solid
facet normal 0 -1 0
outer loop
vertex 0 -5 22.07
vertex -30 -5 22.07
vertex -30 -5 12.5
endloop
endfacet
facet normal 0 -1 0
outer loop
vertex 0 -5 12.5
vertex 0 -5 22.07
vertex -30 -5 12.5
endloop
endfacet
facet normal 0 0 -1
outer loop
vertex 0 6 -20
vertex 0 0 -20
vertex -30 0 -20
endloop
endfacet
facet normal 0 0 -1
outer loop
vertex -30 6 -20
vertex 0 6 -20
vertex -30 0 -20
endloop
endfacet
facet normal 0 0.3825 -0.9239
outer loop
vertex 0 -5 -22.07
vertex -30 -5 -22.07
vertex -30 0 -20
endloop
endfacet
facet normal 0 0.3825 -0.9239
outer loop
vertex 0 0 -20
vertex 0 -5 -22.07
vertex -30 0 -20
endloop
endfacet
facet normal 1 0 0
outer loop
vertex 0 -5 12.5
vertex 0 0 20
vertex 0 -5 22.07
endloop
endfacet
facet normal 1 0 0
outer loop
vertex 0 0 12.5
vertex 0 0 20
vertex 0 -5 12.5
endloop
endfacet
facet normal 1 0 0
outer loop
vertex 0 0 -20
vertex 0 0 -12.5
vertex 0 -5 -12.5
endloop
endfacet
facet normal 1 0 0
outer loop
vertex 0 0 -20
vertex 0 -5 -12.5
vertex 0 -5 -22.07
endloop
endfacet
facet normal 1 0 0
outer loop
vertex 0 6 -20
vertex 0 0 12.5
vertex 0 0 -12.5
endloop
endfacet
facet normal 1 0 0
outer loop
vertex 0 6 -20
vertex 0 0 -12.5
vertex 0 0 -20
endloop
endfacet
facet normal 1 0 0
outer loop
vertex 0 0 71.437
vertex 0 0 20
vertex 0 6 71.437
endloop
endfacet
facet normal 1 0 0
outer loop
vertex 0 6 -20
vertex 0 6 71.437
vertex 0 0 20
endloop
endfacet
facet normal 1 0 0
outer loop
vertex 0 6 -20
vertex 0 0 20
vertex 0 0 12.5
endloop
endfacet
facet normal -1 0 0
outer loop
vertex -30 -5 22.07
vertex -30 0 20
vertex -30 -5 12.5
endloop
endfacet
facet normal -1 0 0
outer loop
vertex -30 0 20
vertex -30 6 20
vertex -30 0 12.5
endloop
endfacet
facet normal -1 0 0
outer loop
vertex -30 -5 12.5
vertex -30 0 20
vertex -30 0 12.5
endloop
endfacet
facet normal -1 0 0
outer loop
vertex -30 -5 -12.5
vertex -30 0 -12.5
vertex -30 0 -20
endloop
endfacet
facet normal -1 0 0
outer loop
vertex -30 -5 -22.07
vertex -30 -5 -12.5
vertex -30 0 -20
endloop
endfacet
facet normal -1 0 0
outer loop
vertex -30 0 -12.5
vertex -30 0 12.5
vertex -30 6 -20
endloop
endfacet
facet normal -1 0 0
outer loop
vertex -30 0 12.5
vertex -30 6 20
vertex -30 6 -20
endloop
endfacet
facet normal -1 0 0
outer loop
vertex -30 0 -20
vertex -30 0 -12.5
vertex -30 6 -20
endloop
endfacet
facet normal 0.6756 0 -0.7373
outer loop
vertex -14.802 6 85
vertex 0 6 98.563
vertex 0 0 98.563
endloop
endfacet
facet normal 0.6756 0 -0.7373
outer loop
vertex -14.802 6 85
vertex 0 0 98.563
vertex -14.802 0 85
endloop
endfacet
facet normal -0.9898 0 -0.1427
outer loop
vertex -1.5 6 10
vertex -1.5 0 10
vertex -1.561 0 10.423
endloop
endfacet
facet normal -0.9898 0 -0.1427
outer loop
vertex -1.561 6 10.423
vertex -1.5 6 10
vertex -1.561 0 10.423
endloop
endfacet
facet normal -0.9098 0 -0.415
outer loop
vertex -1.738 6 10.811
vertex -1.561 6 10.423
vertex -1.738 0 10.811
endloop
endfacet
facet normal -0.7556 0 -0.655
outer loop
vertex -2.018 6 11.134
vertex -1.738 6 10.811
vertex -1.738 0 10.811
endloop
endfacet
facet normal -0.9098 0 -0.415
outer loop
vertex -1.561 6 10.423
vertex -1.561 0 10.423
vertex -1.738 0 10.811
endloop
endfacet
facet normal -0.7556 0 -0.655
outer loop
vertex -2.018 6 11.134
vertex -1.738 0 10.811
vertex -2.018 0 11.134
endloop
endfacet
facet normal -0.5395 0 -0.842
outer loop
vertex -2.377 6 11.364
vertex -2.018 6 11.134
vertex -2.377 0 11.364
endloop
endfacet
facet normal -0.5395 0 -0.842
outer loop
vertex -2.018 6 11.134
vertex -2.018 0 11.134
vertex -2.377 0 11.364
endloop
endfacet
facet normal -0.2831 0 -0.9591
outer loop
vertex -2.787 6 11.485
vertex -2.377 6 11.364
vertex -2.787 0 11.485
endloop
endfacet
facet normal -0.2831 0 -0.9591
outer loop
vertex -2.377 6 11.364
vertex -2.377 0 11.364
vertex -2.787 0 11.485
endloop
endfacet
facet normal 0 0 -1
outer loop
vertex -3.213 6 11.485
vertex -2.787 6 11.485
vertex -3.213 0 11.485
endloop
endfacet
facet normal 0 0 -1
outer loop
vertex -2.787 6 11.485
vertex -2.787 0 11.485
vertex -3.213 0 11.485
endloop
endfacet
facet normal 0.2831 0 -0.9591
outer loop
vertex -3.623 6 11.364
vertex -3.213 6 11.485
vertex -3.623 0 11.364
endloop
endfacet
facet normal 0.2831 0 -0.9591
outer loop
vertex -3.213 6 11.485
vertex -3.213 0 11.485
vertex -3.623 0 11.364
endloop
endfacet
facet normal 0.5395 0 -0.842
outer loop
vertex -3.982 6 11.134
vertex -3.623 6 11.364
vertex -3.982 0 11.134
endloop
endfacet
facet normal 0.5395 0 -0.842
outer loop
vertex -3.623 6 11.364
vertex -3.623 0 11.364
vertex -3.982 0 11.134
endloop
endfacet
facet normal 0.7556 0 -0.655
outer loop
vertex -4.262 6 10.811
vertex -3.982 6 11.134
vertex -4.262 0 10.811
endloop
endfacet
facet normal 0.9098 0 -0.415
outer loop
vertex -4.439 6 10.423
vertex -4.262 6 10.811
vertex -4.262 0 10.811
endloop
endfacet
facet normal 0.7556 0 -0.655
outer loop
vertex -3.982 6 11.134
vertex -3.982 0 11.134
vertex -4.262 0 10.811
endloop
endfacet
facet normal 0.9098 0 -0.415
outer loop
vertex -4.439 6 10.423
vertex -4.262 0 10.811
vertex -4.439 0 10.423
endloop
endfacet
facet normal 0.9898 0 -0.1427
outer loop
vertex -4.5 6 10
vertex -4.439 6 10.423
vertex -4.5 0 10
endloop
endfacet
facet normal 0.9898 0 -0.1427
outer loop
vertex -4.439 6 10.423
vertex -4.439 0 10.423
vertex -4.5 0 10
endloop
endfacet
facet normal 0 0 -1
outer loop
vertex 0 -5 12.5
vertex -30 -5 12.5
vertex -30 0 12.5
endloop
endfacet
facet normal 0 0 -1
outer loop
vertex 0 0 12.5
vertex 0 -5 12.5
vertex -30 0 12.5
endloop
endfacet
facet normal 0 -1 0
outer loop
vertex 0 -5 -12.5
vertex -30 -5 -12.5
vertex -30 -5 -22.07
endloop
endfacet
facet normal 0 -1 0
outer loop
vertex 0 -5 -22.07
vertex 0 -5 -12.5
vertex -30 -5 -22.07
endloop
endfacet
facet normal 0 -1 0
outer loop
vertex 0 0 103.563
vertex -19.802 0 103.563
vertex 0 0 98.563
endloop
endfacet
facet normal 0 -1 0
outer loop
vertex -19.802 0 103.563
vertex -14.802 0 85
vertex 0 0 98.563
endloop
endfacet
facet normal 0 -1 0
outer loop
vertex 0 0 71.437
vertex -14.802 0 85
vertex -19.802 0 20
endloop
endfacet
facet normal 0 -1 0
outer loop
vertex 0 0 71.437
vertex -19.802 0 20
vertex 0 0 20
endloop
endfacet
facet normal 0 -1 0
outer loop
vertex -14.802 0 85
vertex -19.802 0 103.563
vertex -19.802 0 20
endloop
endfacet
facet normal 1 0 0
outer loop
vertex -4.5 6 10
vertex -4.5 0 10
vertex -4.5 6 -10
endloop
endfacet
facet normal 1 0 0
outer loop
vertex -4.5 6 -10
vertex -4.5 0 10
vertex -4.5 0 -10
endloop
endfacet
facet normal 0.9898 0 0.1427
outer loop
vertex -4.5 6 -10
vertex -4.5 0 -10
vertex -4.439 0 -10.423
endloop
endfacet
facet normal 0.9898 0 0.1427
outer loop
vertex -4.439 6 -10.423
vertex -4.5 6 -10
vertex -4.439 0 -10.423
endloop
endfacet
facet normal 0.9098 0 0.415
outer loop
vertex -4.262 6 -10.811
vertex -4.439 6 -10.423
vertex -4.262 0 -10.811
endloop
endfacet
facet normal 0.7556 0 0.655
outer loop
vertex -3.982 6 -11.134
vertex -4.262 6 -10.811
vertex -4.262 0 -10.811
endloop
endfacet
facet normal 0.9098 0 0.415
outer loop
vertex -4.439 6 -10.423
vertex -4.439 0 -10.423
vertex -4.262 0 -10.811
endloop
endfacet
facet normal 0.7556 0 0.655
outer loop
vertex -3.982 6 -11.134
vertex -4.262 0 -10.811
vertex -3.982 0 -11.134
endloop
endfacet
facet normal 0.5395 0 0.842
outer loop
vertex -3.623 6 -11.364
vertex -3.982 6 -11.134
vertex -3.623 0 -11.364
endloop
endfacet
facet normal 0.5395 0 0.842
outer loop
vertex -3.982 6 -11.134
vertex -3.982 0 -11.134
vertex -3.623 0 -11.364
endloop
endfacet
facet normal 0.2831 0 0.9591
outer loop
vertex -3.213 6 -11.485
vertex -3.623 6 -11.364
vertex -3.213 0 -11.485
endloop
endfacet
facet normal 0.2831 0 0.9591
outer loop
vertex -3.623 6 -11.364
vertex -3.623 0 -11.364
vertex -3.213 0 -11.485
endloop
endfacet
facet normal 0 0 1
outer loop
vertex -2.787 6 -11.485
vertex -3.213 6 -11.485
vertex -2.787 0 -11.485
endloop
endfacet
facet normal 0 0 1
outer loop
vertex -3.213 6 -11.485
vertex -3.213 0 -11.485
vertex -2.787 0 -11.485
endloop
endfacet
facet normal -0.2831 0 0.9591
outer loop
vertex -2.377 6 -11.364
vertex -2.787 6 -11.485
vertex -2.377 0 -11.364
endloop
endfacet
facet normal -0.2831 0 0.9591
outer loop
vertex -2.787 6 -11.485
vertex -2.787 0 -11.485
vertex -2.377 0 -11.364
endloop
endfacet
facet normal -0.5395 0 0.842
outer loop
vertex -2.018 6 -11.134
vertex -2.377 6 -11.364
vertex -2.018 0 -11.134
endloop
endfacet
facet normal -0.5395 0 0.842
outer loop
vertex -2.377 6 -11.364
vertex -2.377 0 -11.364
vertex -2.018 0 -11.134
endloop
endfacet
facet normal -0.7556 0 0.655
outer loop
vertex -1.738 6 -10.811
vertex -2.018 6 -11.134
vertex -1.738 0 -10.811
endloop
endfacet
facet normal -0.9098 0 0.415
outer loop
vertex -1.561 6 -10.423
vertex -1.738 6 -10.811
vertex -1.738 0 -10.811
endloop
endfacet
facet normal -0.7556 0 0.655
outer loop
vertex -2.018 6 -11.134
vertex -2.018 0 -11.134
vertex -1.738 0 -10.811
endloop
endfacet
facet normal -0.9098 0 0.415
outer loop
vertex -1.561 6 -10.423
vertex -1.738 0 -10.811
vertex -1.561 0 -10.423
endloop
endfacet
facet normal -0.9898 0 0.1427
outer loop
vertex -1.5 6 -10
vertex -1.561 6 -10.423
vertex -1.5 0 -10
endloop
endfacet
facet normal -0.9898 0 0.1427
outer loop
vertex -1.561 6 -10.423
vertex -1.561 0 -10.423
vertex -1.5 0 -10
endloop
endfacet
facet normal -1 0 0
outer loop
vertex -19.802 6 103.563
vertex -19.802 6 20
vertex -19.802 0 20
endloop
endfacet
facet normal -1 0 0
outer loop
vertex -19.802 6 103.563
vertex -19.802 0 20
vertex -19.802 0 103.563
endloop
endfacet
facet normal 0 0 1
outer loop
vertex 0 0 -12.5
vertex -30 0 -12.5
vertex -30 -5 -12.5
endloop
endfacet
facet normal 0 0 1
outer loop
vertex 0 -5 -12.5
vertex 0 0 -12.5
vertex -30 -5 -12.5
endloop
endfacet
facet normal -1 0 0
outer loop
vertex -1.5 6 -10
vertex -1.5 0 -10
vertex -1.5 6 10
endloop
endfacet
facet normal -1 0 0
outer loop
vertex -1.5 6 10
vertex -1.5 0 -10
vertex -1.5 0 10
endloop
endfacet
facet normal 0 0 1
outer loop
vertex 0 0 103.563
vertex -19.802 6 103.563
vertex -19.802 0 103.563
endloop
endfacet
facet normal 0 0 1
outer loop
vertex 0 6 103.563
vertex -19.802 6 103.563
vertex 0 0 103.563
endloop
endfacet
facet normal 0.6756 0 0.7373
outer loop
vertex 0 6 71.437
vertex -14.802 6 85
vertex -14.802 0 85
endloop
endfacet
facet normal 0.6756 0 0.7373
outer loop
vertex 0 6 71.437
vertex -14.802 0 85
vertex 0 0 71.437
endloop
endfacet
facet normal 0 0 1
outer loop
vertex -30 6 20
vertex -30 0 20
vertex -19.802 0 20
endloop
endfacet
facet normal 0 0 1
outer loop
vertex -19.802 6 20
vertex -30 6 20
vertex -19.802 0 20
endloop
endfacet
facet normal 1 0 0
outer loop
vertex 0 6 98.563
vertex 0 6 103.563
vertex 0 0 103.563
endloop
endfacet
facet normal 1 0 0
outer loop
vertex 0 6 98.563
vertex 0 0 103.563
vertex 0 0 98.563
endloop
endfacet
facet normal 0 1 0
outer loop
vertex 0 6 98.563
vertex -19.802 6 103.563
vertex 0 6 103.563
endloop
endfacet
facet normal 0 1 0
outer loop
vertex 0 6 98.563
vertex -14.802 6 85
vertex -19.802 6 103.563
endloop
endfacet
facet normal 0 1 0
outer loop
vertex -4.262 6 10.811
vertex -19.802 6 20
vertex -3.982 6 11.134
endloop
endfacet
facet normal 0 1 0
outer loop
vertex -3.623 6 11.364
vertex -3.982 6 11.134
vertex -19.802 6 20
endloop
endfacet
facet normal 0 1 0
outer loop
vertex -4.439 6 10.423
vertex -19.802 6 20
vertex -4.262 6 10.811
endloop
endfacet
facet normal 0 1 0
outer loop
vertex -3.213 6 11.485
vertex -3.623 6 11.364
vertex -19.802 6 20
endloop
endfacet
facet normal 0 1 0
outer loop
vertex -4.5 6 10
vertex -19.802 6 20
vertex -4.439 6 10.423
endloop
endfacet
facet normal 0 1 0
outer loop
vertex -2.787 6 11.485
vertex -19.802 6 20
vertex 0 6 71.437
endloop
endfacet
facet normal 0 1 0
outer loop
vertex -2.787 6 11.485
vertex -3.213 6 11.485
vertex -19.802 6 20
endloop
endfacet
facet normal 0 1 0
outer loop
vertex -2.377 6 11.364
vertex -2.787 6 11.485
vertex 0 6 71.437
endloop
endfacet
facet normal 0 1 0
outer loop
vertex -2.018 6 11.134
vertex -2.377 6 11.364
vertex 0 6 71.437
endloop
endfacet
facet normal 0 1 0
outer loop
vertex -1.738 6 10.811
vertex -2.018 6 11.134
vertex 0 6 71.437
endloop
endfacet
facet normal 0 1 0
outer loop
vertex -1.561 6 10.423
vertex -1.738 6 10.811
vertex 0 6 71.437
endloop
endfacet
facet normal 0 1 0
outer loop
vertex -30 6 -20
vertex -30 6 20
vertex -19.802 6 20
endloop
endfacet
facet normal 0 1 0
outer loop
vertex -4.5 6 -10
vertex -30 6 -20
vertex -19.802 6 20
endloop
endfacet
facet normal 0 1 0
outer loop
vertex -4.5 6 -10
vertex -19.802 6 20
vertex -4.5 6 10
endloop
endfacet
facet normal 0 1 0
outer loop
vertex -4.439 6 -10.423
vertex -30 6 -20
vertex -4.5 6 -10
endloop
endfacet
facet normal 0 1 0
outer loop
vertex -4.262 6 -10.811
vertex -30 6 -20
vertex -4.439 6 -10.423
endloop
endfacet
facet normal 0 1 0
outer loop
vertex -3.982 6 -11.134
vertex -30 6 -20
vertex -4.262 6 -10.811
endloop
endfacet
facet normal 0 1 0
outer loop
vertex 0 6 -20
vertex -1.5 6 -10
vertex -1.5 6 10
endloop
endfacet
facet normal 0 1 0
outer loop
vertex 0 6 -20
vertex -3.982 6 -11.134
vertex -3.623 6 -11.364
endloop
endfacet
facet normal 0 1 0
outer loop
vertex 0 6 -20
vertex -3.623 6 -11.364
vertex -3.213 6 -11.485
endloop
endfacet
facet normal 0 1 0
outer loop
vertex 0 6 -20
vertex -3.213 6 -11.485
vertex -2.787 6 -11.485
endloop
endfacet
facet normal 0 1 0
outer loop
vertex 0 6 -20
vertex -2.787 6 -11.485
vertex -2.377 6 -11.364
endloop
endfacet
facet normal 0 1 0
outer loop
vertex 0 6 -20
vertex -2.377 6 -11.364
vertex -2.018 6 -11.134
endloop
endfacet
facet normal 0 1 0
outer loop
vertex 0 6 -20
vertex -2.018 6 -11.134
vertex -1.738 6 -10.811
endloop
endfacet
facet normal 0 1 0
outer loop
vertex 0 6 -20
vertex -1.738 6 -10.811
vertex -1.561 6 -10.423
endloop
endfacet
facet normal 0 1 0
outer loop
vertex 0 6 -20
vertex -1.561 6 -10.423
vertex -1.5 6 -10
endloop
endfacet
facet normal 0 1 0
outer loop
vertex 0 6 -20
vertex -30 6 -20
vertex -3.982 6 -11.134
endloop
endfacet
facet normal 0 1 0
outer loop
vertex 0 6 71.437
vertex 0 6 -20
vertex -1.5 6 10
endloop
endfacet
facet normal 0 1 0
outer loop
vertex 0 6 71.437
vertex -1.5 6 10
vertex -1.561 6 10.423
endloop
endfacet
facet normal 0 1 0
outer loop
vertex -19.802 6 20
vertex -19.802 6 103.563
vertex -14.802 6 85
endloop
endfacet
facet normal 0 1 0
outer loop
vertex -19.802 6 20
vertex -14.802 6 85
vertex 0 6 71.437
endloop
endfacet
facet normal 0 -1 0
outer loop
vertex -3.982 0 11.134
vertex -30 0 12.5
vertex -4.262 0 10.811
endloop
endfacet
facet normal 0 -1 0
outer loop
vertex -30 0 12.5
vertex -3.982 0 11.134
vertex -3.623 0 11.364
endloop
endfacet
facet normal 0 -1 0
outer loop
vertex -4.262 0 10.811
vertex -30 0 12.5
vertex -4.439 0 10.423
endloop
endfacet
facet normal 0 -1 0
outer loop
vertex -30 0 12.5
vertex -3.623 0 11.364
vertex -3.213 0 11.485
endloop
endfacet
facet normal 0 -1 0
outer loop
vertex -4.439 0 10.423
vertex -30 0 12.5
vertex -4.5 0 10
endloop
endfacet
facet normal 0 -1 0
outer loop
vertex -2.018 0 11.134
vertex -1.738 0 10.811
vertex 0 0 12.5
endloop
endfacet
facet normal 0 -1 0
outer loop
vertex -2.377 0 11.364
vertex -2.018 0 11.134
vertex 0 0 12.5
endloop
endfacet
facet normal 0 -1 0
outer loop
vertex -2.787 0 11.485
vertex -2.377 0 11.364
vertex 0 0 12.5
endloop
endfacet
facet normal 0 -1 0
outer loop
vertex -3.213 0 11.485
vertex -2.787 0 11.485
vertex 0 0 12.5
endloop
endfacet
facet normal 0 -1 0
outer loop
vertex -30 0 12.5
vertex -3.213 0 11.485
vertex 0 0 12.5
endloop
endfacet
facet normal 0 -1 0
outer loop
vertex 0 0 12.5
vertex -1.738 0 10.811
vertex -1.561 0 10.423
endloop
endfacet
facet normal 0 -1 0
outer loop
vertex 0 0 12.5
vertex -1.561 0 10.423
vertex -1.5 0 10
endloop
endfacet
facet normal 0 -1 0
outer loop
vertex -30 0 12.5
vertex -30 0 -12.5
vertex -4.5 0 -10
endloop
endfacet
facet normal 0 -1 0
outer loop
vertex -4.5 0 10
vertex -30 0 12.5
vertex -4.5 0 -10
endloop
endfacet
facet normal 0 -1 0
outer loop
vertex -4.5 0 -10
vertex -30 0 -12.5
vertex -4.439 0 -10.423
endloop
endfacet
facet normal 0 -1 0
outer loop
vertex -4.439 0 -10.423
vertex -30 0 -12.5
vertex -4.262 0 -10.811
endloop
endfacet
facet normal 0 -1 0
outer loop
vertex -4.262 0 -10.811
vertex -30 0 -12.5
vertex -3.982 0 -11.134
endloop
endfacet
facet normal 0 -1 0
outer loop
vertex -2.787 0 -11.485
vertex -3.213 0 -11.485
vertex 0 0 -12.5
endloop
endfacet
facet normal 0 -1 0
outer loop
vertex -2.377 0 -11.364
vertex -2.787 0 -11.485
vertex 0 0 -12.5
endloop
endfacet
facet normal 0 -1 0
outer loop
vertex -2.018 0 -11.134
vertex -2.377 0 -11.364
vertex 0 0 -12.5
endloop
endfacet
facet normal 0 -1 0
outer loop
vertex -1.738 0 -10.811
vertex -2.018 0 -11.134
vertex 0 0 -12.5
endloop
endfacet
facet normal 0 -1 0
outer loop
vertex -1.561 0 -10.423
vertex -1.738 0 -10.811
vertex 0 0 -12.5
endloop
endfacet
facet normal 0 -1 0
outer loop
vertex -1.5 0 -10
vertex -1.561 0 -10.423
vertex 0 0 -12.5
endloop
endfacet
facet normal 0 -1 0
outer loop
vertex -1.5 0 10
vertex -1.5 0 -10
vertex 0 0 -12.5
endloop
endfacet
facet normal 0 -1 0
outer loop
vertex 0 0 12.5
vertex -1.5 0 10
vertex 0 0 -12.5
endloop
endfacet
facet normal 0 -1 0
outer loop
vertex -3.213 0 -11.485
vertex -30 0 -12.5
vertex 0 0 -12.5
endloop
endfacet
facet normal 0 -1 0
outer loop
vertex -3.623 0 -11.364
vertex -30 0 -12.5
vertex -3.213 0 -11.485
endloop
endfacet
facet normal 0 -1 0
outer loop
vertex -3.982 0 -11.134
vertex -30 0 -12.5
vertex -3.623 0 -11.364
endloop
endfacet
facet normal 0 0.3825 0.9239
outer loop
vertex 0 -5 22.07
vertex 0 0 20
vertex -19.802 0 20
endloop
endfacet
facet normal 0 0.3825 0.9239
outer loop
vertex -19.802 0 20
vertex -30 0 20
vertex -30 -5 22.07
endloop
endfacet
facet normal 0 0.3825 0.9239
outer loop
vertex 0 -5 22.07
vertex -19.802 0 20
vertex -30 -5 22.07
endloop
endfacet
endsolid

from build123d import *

# Parameters (mm, degrees)
BOSS_EXTRUDE1_DEPTH        = 6
DOVE_BOSS_DEPTH            = 30
BOSS_EXTRUDE7_DEPTH        = 30
PIN_SLOT_REACH             = 39.724
PIN_SLOT_DIRECTION_2_DEPTH = 38.723710458
BOSS_EXTRUDE8_DEPTH        = 6


with BuildPart() as part:
    # Sketch1 → Boss-Extrude1 (new body)
    with BuildSketch(Plane(origin=(0, 0, 0), x_dir=(1, 0, 0), z_dir=(0, 1, 0))):
        Polygon((-30, 20), (-30, -20), (0, -20), (0, -8.167550091), (-6.853388269, 0), (0, 8.167550091), (0, 20), align=None)
        Polygon((-6.853388269, 0), (0, -8.167550091), (0, 8.167550091), align=None)
    extrude(amount=BOSS_EXTRUDE1_DEPTH)

    # Sketch7 → Dove Boss (add)
    with BuildSketch(Plane(origin=(-30, 0, 0), x_dir=(0, 0, -1), z_dir=(1, 0, 0))):
        Polygon((-12.5, 0), (-20, 0), (-22.069851171, -5), (-12.5, -5), align=None)
    extrude(amount=DOVE_BOSS_DEPTH)

    # Sketch7<3> → Boss-Extrude7 (add)
    with BuildSketch(Plane(origin=(-30, 0, 0), x_dir=(0, 0, -1), z_dir=(1, 0, 0))):
        Polygon((20, 0), (12.5, 0), (12.5, -5), (22.069851171, -5), align=None)
    extrude(amount=BOSS_EXTRUDE7_DEPTH)

    # Sketch4 → Pin Slot (cut, up to next)
    with BuildSketch(Plane(origin=(0, 0, 0), x_dir=(1, 0, 0), z_dir=(0, 1, 0)), mode=Mode.PRIVATE) as pin_slot_sk1:
        with BuildLine():
            Line((-1.5, 10), (-1.5, -10))
            ThreePointArc((-1.5, -10), (-3, -11.5), (-4.5, -10))
            Line((-4.5, -10), (-4.5, 10))
            ThreePointArc((-4.5, 10), (-3, 11.5), (-1.5, 10))
        make_face()
    pin_slot_tool1 = extrude(pin_slot_sk1.sketch, amount=PIN_SLOT_REACH, mode=Mode.PRIVATE) & part.part
    add(pin_slot_tool1.solids().sort_by_distance((-3, 0, 0))[0], mode=Mode.SUBTRACT)

    # Sketch4 → Pin Slot direction 2 (cut)
    with BuildSketch(Plane(origin=(0, 0, 0), x_dir=(1, 0, 0), z_dir=(0, 1, 0))):
        with BuildLine():
            Line((-1.5, 10), (-1.5, -10))
            ThreePointArc((-1.5, -10), (-3, -11.5), (-4.5, -10))
            Line((-4.5, -10), (-4.5, 10))
            ThreePointArc((-4.5, 10), (-3, 11.5), (-1.5, 10))
        make_face()
    extrude(amount=-PIN_SLOT_DIRECTION_2_DEPTH, mode=Mode.SUBTRACT)

    # Sketch8 → Boss-Extrude8 (add)
    with BuildSketch(Plane(origin=(0, 6, 0), x_dir=(1, 0, 0), z_dir=(0, 1, 0))):
        Polygon((0, -103.563417049), (0, -98.563417049), (-14.801872329, -85), (0, -71.436582951), (0, -20), (-19.801872329, -20), (-19.801872329, -103.563417049), align=None)
    extrude(amount=-BOSS_EXTRUDE8_DEPTH)


solid = part.part
